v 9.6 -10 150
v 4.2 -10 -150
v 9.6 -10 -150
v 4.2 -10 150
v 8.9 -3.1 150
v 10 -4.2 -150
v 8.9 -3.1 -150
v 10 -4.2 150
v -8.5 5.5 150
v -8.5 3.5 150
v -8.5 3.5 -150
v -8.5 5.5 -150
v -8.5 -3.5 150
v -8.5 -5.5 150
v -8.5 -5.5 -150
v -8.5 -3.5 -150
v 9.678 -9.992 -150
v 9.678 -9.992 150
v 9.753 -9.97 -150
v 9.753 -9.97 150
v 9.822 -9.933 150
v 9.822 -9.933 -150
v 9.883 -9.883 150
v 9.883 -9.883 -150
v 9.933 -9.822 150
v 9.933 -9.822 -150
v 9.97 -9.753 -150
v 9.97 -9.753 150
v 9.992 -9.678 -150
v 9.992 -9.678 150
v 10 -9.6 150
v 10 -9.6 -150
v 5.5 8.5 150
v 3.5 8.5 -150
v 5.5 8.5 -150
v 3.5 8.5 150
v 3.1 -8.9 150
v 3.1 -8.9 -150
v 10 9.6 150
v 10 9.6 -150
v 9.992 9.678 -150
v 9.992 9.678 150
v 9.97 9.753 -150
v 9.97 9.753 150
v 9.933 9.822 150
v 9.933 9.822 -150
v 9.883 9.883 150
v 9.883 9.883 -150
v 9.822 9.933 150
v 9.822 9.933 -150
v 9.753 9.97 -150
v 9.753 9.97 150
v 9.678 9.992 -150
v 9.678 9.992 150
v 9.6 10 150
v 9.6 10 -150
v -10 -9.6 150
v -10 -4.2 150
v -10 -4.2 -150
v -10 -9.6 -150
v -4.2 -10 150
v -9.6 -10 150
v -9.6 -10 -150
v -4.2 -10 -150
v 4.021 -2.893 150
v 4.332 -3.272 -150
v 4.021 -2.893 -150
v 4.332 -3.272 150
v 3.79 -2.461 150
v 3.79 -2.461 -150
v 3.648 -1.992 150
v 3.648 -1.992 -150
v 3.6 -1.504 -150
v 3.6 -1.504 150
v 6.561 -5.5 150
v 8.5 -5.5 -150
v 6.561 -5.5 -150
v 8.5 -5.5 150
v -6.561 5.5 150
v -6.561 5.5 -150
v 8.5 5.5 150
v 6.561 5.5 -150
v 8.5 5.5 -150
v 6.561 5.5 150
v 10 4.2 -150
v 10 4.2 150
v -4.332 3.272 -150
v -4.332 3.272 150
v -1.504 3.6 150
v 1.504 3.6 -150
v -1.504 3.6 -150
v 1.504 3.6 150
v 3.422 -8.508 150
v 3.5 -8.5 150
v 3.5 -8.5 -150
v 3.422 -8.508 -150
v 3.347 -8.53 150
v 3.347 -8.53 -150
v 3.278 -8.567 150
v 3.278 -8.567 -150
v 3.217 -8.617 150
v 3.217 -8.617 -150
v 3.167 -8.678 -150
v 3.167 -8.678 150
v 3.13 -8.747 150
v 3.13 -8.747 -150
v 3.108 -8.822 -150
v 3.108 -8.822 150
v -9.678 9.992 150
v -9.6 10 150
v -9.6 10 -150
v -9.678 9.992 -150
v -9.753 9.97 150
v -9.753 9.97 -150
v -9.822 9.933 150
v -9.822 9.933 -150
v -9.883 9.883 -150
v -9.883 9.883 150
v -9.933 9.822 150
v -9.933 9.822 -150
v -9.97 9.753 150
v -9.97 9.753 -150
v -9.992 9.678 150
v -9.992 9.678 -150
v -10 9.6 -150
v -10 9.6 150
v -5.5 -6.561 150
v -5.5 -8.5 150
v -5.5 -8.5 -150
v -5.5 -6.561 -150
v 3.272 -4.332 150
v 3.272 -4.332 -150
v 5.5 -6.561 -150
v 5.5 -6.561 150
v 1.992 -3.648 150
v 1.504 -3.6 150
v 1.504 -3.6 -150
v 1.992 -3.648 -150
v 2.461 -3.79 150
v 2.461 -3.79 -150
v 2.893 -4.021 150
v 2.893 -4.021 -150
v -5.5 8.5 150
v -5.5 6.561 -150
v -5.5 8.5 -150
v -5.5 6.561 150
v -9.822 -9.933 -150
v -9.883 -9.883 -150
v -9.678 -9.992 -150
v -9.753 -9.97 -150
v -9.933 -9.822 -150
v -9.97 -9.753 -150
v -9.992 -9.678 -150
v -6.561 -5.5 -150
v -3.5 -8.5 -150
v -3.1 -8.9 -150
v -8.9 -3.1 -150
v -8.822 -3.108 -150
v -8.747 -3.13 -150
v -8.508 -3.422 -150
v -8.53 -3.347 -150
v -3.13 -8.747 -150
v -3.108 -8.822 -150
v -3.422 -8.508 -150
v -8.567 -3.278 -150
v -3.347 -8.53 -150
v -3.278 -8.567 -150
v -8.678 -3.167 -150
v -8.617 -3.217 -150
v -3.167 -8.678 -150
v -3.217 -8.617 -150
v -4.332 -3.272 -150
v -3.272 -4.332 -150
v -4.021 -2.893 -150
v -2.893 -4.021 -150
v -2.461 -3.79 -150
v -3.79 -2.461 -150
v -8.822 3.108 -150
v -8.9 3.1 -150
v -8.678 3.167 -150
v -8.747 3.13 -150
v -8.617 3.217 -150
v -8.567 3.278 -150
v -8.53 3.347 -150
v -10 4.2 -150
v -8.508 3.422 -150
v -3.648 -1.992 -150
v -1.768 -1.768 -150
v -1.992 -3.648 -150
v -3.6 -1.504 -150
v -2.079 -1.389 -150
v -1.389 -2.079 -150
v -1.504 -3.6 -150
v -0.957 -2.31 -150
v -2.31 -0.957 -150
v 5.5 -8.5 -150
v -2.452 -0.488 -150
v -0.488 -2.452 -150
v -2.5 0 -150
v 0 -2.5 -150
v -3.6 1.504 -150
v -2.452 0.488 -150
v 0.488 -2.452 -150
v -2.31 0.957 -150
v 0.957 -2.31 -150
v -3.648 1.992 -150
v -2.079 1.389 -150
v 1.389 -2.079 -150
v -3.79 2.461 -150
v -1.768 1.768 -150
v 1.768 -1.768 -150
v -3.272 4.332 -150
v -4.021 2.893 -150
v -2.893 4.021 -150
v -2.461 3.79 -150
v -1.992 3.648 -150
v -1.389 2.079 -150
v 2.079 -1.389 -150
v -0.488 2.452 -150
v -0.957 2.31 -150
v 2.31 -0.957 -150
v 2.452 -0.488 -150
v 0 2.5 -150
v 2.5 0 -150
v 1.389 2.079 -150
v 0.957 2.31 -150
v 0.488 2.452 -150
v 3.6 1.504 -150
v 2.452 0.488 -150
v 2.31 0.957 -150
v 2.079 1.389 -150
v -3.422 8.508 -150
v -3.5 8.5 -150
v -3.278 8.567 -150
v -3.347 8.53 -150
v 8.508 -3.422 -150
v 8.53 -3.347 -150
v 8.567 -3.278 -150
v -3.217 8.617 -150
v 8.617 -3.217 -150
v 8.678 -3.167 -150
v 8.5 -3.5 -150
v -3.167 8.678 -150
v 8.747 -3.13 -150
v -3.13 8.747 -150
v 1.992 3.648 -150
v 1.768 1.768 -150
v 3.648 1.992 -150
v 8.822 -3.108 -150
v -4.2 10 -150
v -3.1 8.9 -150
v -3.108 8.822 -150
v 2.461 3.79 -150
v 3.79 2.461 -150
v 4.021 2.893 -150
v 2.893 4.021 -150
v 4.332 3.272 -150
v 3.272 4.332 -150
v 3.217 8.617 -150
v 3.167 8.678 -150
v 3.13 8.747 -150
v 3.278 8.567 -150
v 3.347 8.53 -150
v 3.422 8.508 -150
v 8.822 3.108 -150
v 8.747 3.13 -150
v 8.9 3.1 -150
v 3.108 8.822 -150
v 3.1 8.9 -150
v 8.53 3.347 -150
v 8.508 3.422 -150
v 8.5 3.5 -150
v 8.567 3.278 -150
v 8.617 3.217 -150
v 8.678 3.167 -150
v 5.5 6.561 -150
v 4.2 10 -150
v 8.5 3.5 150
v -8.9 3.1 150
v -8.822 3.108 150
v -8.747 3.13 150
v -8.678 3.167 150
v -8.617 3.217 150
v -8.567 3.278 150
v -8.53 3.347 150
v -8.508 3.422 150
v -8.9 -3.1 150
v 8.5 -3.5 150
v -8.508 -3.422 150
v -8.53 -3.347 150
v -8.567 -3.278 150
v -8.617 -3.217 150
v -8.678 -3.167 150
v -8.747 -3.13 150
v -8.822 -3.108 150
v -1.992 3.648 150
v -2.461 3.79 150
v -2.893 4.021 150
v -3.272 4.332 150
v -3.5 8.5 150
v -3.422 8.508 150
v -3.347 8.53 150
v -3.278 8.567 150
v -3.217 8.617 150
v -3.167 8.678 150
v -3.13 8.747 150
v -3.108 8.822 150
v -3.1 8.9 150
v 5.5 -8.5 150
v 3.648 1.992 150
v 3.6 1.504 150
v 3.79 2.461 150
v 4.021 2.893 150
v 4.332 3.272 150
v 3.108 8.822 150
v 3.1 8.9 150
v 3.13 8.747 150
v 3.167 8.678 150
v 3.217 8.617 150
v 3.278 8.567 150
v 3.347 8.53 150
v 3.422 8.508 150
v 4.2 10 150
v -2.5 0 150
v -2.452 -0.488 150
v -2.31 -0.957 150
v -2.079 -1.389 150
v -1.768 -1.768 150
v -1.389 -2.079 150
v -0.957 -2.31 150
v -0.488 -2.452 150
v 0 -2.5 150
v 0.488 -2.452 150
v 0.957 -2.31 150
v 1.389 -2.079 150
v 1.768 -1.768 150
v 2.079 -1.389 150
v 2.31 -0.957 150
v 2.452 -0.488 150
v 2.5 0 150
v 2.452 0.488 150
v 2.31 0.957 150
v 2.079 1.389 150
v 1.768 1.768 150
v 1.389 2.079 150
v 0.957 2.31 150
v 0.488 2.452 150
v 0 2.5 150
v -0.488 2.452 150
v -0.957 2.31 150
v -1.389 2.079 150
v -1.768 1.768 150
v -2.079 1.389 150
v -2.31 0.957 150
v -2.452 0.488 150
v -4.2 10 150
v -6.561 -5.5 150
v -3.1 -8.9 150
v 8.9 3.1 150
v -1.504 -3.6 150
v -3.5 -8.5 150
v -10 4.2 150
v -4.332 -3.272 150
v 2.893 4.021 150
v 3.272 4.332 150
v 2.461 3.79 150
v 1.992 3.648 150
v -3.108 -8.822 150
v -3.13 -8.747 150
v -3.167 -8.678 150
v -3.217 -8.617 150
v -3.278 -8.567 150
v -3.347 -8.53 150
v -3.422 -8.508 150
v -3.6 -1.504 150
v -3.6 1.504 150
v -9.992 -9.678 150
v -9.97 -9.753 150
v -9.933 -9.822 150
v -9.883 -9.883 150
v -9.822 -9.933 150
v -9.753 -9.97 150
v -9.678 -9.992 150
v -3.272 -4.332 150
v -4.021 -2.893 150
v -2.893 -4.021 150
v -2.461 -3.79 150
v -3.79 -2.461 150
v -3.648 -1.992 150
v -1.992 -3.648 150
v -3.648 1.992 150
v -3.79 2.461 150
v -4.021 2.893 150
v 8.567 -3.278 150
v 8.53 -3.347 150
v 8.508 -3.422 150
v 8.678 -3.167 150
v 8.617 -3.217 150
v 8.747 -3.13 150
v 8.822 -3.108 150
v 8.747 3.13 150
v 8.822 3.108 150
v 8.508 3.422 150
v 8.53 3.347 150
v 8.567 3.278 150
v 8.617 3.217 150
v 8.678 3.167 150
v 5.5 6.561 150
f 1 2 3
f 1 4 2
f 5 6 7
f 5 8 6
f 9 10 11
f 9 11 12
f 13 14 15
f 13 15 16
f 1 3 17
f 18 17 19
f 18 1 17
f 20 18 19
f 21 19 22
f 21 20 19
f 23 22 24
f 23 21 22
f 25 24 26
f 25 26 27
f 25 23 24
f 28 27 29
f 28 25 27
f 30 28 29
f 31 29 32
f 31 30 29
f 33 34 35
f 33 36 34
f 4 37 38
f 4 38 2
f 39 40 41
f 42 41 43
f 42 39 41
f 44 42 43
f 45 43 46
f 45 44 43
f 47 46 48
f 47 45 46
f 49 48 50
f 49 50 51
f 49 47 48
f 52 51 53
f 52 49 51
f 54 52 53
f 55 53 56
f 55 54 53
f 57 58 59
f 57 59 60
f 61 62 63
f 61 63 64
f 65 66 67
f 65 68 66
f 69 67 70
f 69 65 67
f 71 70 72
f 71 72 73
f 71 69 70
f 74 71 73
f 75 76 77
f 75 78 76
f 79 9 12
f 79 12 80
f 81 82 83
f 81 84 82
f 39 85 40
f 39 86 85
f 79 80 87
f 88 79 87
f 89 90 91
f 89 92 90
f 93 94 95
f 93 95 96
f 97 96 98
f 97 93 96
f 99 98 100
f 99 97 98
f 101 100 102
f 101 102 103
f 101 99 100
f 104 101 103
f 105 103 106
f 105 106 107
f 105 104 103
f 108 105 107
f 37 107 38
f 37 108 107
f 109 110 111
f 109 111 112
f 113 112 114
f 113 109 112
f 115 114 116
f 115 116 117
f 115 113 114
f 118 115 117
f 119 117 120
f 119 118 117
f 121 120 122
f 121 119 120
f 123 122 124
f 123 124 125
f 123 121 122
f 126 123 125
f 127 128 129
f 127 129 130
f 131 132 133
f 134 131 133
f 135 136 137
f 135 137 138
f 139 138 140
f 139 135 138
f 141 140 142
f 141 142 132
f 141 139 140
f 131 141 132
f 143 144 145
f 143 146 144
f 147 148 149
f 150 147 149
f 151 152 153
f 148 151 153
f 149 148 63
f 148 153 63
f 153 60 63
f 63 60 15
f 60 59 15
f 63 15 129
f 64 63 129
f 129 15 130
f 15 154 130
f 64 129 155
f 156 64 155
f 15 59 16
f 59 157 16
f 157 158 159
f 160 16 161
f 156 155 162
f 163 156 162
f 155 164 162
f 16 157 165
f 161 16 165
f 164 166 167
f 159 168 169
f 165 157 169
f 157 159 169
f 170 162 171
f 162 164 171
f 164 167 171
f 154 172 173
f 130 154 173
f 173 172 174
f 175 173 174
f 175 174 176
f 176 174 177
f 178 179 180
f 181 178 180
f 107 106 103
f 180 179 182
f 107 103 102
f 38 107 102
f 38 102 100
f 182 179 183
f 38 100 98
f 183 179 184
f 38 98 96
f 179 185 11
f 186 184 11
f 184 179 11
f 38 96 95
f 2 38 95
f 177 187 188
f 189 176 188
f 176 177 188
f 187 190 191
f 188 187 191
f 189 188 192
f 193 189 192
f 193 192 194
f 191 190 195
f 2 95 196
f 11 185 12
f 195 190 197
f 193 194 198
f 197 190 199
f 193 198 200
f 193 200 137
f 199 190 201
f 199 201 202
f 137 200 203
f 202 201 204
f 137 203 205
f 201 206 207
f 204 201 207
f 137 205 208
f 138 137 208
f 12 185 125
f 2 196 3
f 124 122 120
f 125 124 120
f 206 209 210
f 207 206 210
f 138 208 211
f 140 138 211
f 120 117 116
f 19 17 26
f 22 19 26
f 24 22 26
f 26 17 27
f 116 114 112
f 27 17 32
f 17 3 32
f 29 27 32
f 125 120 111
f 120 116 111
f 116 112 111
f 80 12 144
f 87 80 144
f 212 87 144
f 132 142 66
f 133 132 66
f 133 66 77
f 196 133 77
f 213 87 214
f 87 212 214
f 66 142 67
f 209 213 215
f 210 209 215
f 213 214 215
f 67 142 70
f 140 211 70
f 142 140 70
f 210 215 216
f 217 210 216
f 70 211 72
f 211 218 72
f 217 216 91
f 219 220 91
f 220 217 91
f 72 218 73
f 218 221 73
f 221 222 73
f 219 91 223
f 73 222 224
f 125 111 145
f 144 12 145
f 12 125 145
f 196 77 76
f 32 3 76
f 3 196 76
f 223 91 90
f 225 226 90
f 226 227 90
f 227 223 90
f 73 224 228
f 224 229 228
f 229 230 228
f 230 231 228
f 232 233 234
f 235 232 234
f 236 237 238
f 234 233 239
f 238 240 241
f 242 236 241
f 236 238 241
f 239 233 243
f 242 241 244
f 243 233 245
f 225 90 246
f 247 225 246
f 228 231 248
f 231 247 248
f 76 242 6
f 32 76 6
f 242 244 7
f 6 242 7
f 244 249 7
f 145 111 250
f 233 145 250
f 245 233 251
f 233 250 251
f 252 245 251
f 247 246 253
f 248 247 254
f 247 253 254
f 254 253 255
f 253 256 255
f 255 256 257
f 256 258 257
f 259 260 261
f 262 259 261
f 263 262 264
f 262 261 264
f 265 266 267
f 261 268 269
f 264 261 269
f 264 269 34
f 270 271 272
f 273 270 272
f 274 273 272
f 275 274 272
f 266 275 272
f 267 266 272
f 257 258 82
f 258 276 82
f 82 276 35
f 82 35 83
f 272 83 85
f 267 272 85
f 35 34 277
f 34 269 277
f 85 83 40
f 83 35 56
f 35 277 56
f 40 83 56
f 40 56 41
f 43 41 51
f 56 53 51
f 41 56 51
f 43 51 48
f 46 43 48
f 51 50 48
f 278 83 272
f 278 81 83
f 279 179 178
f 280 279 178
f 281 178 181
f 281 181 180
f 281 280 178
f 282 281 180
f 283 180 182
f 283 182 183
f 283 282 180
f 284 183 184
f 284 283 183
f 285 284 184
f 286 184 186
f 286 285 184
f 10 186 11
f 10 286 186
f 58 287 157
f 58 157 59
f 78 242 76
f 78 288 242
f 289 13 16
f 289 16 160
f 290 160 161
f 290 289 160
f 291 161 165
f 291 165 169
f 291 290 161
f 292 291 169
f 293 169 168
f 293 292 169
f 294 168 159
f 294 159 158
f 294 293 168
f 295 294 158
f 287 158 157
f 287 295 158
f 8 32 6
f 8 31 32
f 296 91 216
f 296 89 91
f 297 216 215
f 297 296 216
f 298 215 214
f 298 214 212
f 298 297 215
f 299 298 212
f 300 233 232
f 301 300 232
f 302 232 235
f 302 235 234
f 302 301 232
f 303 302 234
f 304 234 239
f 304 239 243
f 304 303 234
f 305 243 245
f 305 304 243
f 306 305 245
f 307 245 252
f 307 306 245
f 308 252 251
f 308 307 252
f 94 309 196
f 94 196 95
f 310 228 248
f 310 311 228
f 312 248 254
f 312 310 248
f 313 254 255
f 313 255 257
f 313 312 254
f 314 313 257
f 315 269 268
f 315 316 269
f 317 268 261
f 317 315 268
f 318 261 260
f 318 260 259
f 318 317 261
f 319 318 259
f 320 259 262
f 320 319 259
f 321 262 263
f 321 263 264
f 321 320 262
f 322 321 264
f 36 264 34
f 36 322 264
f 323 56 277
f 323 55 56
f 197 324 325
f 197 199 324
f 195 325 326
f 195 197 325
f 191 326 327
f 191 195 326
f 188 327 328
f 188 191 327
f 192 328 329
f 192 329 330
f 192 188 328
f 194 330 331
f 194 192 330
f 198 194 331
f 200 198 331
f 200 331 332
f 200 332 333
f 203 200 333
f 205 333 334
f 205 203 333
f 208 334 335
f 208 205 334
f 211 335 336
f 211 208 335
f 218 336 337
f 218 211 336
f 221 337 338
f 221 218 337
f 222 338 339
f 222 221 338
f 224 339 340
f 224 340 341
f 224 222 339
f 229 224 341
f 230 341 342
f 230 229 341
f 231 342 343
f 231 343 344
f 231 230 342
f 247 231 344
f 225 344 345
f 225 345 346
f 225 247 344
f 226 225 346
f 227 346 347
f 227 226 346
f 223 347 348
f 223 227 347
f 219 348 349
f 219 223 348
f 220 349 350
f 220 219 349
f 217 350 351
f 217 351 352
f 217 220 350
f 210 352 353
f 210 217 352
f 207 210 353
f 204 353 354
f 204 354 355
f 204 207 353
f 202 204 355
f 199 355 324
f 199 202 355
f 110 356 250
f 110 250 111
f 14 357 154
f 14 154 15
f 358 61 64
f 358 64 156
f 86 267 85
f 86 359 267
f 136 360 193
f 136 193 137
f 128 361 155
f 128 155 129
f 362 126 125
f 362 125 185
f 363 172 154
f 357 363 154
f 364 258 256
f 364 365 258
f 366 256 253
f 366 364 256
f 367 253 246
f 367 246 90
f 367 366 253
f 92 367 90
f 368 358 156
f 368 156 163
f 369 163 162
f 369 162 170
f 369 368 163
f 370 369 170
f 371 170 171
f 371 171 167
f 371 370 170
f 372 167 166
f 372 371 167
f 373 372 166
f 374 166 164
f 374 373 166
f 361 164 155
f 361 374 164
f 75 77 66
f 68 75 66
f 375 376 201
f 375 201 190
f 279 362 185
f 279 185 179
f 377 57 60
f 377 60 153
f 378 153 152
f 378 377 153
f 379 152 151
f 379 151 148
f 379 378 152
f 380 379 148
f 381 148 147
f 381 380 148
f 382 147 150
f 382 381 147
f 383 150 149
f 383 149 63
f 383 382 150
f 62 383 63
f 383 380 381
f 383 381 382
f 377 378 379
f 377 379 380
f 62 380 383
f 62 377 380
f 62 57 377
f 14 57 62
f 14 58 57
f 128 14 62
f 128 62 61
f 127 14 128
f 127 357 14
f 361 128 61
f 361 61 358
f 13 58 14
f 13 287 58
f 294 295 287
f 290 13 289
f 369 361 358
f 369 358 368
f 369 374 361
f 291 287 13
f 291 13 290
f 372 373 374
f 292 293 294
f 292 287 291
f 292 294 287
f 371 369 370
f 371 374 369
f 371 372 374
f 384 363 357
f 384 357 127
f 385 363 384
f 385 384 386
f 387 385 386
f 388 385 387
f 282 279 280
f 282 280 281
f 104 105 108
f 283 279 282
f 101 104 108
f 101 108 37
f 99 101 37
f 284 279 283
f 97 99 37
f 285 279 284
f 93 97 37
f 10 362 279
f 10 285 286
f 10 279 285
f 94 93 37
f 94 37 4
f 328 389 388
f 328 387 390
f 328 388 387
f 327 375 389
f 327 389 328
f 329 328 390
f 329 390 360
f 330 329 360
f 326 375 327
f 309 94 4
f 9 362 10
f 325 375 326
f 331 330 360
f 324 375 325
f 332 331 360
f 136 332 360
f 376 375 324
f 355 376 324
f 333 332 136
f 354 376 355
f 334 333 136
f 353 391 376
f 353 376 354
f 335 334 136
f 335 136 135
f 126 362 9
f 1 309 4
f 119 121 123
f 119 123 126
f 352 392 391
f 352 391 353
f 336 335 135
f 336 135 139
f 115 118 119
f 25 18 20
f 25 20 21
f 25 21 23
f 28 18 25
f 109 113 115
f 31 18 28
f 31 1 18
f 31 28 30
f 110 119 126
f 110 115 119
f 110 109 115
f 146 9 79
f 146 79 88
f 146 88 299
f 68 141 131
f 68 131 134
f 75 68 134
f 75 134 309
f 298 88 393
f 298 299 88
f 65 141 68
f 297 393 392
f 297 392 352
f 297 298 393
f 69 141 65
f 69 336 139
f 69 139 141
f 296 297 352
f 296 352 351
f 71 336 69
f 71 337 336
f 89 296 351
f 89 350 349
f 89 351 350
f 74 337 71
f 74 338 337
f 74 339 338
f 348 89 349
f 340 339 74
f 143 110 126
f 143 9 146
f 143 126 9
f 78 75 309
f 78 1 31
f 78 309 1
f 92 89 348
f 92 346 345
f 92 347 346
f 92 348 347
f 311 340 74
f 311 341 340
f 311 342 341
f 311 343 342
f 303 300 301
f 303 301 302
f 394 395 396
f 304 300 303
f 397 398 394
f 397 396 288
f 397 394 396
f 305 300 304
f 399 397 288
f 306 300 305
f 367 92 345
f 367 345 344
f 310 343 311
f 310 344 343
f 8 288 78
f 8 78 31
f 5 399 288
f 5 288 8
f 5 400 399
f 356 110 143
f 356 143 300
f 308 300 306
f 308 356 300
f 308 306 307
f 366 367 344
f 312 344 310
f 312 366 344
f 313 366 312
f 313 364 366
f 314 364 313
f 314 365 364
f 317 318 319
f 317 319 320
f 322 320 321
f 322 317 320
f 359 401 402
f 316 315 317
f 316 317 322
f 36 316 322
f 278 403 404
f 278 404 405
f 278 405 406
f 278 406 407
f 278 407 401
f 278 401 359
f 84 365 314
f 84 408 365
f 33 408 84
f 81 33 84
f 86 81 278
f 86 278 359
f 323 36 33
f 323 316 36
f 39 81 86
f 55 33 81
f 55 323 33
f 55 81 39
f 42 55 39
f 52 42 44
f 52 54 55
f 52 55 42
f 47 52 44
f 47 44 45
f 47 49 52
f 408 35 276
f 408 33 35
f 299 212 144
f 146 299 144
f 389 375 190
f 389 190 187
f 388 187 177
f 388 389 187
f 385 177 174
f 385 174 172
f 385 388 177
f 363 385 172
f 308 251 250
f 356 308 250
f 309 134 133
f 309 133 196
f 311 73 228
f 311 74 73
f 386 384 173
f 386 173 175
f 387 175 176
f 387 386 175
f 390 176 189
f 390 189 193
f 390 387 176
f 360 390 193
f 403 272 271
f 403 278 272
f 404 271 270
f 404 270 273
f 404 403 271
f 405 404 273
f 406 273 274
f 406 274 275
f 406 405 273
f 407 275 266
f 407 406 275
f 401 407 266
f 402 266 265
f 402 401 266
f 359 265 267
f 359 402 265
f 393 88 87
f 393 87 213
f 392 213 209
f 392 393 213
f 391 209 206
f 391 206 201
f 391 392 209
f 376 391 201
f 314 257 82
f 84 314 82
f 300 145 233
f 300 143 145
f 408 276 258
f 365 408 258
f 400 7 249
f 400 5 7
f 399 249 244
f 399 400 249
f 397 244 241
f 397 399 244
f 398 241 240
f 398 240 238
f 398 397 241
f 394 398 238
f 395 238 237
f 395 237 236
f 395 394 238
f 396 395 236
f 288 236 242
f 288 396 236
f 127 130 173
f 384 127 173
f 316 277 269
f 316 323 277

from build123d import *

# Parameters (mm, degrees)
RESSALTO_EXTRUS_O1_DEPTH = 150


with BuildPart() as part:
    # Esboço1 → Ressalto-extrusão1 (new, symmetric)
    with BuildSketch(Plane.XY):
        with BuildLine():
            Line((-3.1, 8.9), (-4.2, 10))
            Line((-4.2, 10), (-9.6, 10))
            ThreePointArc((-9.6, 10), (-9.882842712, 9.882842712), (-10, 9.6))
            Line((-10, 9.6), (-10, 4.2))
            Line((-10, 4.2), (-8.9, 3.1))
            ThreePointArc((-8.9, 3.1), (-8.617157287, 3.217157287), (-8.5, 3.5))
            Line((-8.5, 3.5), (-8.5, 5.5))
            Line((-8.5, 5.5), (-6.560660172, 5.5))
            Line((-6.560660172, 5.5), (-4.332233047, 3.271572875))
            ThreePointArc((-4.332233047, 3.271572875), (-3.790301169, 2.460514503), (-3.6, 1.503805922))
            Line((-3.6, 1.503805922), (-3.6, 0))
            Line((-3.6, 0), (-3.6, -1.503805922))
            ThreePointArc((-3.6, -1.503805922), (-3.790301169, -2.460514503), (-4.332233047, -3.271572875))
            Line((-4.332233047, -3.271572875), (-6.560660172, -5.5))
            Line((-6.560660172, -5.5), (-8.5, -5.5))
            Line((-8.5, -5.5), (-8.5, -3.5))
            ThreePointArc((-8.5, -3.5), (-8.617157287, -3.217157288), (-8.9, -3.1))
            Line((-8.9, -3.1), (-10, -4.2))
            Line((-10, -4.2), (-10, -9.6))
            ThreePointArc((-10, -9.6), (-9.882842712, -9.882842712), (-9.6, -10))
            Line((-9.6, -10), (-4.2, -10))
            Line((-4.2, -10), (-3.1, -8.9))
            ThreePointArc((-3.1, -8.9), (-3.217157287, -8.617157288), (-3.5, -8.5))
            Line((-3.5, -8.5), (-5.5, -8.5))
            Line((-5.5, -8.5), (-5.5, -6.560660172))
            Line((-5.5, -6.560660172), (-3.271572875, -4.332233047))
            ThreePointArc((-3.271572875, -4.332233047), (-2.460514503, -3.790301169), (-1.503805922, -3.6))
            Line((-1.503805922, -3.6), (1.503805922, -3.6))
            ThreePointArc((1.503805922, -3.6), (2.460514503, -3.790301169), (3.271572875, -4.332233047))
            Line((3.271572875, -4.332233047), (5.5, -6.560660172))
            Line((5.5, -6.560660172), (5.5, -8.5))
            Line((5.5, -8.5), (3.5, -8.5))
            ThreePointArc((3.5, -8.5), (3.217157288, -8.617157288), (3.1, -8.9))
            Line((3.1, -8.9), (4.2, -10))
            Line((4.2, -10), (9.6, -10))
            ThreePointArc((9.6, -10), (9.882842713, -9.882842712), (10, -9.6))
            Line((10, -9.6), (10, -4.2))
            Line((10, -4.2), (8.9, -3.1))
            ThreePointArc((8.9, -3.1), (8.617157288, -3.217157288), (8.5, -3.5))
            Line((8.5, -3.5), (8.5, -5.5))
            Line((8.5, -5.5), (6.560660172, -5.5))
            Line((6.560660172, -5.5), (4.332233047, -3.271572875))
            ThreePointArc((4.332233047, -3.271572875), (3.790301169, -2.460514503), (3.6, -1.503805922))
            Line((3.6, -1.503805922), (3.6, 0))
            Line((3.6, 0), (3.6, 1.503805922))
            ThreePointArc((3.6, 1.503805922), (3.790301169, 2.460514503), (4.332233047, 3.271572875))
            Line((4.332233047, 3.271572875), (6.560660172, 5.5))
            Line((6.560660172, 5.5), (8.5, 5.5))
            Line((8.5, 5.5), (8.5, 3.5))
            ThreePointArc((8.5, 3.5), (8.617157288, 3.217157287), (8.9, 3.1))
            Line((8.9, 3.1), (10, 4.2))
            Line((10, 4.2), (10, 9.6))
            ThreePointArc((10, 9.6), (9.882842713, 9.882842712), (9.6, 10))
            Line((9.6, 10), (4.2, 10))
            Line((4.2, 10), (3.1, 8.9))
            ThreePointArc((3.1, 8.9), (3.217157288, 8.617157287), (3.5, 8.5))
            Line((3.5, 8.5), (5.5, 8.5))
            Line((5.5, 8.5), (5.5, 6.560660172))
            Line((5.5, 6.560660172), (3.271572875, 4.332233047))
            ThreePointArc((3.271572875, 4.332233047), (2.460514503, 3.790301169), (1.503805922, 3.6))
            Line((1.503805922, 3.6), (-1.503805922, 3.6))
            ThreePointArc((-1.503805922, 3.6), (-2.460514503, 3.790301169), (-3.271572875, 4.332233047))
            Line((-3.271572875, 4.332233047), (-5.5, 6.560660172))
            Line((-5.5, 6.560660172), (-5.5, 8.5))
            Line((-5.5, 8.5), (-3.5, 8.5))
            ThreePointArc((-3.5, 8.5), (-3.217157287, 8.617157287), (-3.1, 8.9))
        make_face()
        with BuildLine():
            ThreePointArc((2.5, 0), (0, 2.5), (-2.5, 0))
            ThreePointArc((-2.5, 0), (0, -2.5), (2.5, 0))
        make_face(mode=Mode.SUBTRACT)
    extrude(amount=RESSALTO_EXTRUS_O1_DEPTH, both=True)


solid = part.part
